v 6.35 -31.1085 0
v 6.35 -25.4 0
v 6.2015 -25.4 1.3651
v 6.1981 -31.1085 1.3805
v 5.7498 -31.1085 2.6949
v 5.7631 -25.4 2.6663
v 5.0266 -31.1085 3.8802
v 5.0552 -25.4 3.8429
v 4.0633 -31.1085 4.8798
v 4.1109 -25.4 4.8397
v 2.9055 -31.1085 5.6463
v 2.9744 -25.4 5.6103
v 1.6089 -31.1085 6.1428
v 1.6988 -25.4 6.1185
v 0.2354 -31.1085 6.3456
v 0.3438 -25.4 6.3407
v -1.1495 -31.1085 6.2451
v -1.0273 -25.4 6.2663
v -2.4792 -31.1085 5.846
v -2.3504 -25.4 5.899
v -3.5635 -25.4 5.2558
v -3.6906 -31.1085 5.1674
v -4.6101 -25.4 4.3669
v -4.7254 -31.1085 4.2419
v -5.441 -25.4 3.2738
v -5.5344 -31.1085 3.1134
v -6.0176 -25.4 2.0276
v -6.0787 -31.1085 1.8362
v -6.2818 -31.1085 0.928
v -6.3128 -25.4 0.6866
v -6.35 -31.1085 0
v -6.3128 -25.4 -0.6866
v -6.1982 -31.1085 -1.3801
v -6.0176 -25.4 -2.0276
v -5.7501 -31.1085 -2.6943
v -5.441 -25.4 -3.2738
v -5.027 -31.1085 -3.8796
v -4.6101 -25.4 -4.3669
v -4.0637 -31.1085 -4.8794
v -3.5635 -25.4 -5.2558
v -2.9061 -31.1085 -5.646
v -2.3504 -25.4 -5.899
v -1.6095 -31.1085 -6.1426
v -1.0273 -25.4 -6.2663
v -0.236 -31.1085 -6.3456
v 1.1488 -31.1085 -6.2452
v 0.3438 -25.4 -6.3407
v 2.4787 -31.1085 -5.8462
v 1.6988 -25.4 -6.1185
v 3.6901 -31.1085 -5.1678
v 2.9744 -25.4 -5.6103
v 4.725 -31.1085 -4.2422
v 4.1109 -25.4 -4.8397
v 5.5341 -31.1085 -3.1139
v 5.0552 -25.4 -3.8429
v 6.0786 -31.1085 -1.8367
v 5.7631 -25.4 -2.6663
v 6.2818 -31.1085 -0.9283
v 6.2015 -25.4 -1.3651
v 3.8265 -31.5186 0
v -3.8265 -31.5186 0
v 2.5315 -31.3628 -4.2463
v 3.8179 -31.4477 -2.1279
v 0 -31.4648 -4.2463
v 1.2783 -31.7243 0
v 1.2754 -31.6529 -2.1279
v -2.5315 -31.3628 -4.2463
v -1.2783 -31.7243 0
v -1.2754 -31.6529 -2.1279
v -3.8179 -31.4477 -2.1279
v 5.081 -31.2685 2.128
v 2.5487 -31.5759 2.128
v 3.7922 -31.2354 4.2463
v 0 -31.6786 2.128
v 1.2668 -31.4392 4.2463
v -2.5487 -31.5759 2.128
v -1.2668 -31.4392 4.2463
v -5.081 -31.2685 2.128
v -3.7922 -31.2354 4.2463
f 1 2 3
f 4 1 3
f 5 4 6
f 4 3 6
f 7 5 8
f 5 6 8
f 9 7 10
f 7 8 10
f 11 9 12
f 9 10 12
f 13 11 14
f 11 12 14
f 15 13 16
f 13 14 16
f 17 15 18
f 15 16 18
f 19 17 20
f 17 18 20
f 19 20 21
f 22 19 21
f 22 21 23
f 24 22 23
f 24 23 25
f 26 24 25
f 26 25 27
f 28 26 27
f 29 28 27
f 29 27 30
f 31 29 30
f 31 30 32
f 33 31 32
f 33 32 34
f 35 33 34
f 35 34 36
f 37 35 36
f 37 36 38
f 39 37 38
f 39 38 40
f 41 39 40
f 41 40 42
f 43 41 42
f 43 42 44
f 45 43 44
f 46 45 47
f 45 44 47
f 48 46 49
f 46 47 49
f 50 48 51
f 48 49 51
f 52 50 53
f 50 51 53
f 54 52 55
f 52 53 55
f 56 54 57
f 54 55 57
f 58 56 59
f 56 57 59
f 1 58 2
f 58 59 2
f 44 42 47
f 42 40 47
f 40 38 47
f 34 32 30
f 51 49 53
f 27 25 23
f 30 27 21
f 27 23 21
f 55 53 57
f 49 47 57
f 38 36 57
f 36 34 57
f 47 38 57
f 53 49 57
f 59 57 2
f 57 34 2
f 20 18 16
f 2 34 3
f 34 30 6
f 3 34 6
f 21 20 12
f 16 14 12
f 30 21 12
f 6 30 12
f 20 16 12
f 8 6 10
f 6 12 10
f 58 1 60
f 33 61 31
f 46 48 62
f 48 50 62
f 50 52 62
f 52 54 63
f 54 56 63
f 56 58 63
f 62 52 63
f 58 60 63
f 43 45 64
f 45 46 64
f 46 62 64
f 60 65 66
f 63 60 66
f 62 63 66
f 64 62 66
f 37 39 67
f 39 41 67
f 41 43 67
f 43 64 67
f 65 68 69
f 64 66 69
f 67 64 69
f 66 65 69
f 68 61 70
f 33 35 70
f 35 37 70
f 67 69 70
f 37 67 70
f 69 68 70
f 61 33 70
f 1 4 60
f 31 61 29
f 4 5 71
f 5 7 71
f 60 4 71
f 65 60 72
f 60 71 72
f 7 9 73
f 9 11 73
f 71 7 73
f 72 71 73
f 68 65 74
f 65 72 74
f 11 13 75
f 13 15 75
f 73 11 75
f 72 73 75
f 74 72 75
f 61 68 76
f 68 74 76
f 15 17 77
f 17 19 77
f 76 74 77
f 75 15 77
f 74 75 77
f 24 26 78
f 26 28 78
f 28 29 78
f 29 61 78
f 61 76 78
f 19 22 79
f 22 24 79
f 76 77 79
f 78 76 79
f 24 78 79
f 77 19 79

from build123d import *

# Parameters (mm, degrees)
F2_R          = 51.3419561809
F2_R_2        = 6.35
F3_DEPTH      = 31.751
F3_DEPTH_BACK = 31.751
F4_R          = 20.622673328
F5_DEPTH      = 31.751
F5_DEPTH_BACK = 25.4


with BuildPart() as f1:
    # F0 (on Front) → F1 (revolve)
    with BuildSketch(Plane.XZ):
        with BuildLine():
            ThreePointArc((0, -31.75), (22.4506403027, -22.4506403027), (31.75, 0))
            ThreePointArc((31.75, 0), (22.4506403027, 22.4506403027), (0, 31.75))
            Line((0, 31.75), (0, -31.75))
        make_face()
    revolve(axis=Axis((0, 0, 0), (0, 0, -1)))

    # F2 (on Front) → F3 (cut, two sides)
    with BuildSketch(Plane.XZ) as f3_sk:
        Circle(F2_R)
        Circle(F2_R_2, mode=Mode.SUBTRACT)
    extrude(amount=-F3_DEPTH, mode=Mode.SUBTRACT)
    extrude(f3_sk.sketch, amount=F3_DEPTH_BACK, mode=Mode.SUBTRACT)

    # F4 (on Front) → F5 (cut, two sides)
    with BuildSketch(Plane.XZ) as f5_sk:
        Circle(F4_R)
    extrude(amount=-F5_DEPTH, mode=Mode.SUBTRACT)
    extrude(f5_sk.sketch, amount=F5_DEPTH_BACK, mode=Mode.SUBTRACT)


solid = f1.part
